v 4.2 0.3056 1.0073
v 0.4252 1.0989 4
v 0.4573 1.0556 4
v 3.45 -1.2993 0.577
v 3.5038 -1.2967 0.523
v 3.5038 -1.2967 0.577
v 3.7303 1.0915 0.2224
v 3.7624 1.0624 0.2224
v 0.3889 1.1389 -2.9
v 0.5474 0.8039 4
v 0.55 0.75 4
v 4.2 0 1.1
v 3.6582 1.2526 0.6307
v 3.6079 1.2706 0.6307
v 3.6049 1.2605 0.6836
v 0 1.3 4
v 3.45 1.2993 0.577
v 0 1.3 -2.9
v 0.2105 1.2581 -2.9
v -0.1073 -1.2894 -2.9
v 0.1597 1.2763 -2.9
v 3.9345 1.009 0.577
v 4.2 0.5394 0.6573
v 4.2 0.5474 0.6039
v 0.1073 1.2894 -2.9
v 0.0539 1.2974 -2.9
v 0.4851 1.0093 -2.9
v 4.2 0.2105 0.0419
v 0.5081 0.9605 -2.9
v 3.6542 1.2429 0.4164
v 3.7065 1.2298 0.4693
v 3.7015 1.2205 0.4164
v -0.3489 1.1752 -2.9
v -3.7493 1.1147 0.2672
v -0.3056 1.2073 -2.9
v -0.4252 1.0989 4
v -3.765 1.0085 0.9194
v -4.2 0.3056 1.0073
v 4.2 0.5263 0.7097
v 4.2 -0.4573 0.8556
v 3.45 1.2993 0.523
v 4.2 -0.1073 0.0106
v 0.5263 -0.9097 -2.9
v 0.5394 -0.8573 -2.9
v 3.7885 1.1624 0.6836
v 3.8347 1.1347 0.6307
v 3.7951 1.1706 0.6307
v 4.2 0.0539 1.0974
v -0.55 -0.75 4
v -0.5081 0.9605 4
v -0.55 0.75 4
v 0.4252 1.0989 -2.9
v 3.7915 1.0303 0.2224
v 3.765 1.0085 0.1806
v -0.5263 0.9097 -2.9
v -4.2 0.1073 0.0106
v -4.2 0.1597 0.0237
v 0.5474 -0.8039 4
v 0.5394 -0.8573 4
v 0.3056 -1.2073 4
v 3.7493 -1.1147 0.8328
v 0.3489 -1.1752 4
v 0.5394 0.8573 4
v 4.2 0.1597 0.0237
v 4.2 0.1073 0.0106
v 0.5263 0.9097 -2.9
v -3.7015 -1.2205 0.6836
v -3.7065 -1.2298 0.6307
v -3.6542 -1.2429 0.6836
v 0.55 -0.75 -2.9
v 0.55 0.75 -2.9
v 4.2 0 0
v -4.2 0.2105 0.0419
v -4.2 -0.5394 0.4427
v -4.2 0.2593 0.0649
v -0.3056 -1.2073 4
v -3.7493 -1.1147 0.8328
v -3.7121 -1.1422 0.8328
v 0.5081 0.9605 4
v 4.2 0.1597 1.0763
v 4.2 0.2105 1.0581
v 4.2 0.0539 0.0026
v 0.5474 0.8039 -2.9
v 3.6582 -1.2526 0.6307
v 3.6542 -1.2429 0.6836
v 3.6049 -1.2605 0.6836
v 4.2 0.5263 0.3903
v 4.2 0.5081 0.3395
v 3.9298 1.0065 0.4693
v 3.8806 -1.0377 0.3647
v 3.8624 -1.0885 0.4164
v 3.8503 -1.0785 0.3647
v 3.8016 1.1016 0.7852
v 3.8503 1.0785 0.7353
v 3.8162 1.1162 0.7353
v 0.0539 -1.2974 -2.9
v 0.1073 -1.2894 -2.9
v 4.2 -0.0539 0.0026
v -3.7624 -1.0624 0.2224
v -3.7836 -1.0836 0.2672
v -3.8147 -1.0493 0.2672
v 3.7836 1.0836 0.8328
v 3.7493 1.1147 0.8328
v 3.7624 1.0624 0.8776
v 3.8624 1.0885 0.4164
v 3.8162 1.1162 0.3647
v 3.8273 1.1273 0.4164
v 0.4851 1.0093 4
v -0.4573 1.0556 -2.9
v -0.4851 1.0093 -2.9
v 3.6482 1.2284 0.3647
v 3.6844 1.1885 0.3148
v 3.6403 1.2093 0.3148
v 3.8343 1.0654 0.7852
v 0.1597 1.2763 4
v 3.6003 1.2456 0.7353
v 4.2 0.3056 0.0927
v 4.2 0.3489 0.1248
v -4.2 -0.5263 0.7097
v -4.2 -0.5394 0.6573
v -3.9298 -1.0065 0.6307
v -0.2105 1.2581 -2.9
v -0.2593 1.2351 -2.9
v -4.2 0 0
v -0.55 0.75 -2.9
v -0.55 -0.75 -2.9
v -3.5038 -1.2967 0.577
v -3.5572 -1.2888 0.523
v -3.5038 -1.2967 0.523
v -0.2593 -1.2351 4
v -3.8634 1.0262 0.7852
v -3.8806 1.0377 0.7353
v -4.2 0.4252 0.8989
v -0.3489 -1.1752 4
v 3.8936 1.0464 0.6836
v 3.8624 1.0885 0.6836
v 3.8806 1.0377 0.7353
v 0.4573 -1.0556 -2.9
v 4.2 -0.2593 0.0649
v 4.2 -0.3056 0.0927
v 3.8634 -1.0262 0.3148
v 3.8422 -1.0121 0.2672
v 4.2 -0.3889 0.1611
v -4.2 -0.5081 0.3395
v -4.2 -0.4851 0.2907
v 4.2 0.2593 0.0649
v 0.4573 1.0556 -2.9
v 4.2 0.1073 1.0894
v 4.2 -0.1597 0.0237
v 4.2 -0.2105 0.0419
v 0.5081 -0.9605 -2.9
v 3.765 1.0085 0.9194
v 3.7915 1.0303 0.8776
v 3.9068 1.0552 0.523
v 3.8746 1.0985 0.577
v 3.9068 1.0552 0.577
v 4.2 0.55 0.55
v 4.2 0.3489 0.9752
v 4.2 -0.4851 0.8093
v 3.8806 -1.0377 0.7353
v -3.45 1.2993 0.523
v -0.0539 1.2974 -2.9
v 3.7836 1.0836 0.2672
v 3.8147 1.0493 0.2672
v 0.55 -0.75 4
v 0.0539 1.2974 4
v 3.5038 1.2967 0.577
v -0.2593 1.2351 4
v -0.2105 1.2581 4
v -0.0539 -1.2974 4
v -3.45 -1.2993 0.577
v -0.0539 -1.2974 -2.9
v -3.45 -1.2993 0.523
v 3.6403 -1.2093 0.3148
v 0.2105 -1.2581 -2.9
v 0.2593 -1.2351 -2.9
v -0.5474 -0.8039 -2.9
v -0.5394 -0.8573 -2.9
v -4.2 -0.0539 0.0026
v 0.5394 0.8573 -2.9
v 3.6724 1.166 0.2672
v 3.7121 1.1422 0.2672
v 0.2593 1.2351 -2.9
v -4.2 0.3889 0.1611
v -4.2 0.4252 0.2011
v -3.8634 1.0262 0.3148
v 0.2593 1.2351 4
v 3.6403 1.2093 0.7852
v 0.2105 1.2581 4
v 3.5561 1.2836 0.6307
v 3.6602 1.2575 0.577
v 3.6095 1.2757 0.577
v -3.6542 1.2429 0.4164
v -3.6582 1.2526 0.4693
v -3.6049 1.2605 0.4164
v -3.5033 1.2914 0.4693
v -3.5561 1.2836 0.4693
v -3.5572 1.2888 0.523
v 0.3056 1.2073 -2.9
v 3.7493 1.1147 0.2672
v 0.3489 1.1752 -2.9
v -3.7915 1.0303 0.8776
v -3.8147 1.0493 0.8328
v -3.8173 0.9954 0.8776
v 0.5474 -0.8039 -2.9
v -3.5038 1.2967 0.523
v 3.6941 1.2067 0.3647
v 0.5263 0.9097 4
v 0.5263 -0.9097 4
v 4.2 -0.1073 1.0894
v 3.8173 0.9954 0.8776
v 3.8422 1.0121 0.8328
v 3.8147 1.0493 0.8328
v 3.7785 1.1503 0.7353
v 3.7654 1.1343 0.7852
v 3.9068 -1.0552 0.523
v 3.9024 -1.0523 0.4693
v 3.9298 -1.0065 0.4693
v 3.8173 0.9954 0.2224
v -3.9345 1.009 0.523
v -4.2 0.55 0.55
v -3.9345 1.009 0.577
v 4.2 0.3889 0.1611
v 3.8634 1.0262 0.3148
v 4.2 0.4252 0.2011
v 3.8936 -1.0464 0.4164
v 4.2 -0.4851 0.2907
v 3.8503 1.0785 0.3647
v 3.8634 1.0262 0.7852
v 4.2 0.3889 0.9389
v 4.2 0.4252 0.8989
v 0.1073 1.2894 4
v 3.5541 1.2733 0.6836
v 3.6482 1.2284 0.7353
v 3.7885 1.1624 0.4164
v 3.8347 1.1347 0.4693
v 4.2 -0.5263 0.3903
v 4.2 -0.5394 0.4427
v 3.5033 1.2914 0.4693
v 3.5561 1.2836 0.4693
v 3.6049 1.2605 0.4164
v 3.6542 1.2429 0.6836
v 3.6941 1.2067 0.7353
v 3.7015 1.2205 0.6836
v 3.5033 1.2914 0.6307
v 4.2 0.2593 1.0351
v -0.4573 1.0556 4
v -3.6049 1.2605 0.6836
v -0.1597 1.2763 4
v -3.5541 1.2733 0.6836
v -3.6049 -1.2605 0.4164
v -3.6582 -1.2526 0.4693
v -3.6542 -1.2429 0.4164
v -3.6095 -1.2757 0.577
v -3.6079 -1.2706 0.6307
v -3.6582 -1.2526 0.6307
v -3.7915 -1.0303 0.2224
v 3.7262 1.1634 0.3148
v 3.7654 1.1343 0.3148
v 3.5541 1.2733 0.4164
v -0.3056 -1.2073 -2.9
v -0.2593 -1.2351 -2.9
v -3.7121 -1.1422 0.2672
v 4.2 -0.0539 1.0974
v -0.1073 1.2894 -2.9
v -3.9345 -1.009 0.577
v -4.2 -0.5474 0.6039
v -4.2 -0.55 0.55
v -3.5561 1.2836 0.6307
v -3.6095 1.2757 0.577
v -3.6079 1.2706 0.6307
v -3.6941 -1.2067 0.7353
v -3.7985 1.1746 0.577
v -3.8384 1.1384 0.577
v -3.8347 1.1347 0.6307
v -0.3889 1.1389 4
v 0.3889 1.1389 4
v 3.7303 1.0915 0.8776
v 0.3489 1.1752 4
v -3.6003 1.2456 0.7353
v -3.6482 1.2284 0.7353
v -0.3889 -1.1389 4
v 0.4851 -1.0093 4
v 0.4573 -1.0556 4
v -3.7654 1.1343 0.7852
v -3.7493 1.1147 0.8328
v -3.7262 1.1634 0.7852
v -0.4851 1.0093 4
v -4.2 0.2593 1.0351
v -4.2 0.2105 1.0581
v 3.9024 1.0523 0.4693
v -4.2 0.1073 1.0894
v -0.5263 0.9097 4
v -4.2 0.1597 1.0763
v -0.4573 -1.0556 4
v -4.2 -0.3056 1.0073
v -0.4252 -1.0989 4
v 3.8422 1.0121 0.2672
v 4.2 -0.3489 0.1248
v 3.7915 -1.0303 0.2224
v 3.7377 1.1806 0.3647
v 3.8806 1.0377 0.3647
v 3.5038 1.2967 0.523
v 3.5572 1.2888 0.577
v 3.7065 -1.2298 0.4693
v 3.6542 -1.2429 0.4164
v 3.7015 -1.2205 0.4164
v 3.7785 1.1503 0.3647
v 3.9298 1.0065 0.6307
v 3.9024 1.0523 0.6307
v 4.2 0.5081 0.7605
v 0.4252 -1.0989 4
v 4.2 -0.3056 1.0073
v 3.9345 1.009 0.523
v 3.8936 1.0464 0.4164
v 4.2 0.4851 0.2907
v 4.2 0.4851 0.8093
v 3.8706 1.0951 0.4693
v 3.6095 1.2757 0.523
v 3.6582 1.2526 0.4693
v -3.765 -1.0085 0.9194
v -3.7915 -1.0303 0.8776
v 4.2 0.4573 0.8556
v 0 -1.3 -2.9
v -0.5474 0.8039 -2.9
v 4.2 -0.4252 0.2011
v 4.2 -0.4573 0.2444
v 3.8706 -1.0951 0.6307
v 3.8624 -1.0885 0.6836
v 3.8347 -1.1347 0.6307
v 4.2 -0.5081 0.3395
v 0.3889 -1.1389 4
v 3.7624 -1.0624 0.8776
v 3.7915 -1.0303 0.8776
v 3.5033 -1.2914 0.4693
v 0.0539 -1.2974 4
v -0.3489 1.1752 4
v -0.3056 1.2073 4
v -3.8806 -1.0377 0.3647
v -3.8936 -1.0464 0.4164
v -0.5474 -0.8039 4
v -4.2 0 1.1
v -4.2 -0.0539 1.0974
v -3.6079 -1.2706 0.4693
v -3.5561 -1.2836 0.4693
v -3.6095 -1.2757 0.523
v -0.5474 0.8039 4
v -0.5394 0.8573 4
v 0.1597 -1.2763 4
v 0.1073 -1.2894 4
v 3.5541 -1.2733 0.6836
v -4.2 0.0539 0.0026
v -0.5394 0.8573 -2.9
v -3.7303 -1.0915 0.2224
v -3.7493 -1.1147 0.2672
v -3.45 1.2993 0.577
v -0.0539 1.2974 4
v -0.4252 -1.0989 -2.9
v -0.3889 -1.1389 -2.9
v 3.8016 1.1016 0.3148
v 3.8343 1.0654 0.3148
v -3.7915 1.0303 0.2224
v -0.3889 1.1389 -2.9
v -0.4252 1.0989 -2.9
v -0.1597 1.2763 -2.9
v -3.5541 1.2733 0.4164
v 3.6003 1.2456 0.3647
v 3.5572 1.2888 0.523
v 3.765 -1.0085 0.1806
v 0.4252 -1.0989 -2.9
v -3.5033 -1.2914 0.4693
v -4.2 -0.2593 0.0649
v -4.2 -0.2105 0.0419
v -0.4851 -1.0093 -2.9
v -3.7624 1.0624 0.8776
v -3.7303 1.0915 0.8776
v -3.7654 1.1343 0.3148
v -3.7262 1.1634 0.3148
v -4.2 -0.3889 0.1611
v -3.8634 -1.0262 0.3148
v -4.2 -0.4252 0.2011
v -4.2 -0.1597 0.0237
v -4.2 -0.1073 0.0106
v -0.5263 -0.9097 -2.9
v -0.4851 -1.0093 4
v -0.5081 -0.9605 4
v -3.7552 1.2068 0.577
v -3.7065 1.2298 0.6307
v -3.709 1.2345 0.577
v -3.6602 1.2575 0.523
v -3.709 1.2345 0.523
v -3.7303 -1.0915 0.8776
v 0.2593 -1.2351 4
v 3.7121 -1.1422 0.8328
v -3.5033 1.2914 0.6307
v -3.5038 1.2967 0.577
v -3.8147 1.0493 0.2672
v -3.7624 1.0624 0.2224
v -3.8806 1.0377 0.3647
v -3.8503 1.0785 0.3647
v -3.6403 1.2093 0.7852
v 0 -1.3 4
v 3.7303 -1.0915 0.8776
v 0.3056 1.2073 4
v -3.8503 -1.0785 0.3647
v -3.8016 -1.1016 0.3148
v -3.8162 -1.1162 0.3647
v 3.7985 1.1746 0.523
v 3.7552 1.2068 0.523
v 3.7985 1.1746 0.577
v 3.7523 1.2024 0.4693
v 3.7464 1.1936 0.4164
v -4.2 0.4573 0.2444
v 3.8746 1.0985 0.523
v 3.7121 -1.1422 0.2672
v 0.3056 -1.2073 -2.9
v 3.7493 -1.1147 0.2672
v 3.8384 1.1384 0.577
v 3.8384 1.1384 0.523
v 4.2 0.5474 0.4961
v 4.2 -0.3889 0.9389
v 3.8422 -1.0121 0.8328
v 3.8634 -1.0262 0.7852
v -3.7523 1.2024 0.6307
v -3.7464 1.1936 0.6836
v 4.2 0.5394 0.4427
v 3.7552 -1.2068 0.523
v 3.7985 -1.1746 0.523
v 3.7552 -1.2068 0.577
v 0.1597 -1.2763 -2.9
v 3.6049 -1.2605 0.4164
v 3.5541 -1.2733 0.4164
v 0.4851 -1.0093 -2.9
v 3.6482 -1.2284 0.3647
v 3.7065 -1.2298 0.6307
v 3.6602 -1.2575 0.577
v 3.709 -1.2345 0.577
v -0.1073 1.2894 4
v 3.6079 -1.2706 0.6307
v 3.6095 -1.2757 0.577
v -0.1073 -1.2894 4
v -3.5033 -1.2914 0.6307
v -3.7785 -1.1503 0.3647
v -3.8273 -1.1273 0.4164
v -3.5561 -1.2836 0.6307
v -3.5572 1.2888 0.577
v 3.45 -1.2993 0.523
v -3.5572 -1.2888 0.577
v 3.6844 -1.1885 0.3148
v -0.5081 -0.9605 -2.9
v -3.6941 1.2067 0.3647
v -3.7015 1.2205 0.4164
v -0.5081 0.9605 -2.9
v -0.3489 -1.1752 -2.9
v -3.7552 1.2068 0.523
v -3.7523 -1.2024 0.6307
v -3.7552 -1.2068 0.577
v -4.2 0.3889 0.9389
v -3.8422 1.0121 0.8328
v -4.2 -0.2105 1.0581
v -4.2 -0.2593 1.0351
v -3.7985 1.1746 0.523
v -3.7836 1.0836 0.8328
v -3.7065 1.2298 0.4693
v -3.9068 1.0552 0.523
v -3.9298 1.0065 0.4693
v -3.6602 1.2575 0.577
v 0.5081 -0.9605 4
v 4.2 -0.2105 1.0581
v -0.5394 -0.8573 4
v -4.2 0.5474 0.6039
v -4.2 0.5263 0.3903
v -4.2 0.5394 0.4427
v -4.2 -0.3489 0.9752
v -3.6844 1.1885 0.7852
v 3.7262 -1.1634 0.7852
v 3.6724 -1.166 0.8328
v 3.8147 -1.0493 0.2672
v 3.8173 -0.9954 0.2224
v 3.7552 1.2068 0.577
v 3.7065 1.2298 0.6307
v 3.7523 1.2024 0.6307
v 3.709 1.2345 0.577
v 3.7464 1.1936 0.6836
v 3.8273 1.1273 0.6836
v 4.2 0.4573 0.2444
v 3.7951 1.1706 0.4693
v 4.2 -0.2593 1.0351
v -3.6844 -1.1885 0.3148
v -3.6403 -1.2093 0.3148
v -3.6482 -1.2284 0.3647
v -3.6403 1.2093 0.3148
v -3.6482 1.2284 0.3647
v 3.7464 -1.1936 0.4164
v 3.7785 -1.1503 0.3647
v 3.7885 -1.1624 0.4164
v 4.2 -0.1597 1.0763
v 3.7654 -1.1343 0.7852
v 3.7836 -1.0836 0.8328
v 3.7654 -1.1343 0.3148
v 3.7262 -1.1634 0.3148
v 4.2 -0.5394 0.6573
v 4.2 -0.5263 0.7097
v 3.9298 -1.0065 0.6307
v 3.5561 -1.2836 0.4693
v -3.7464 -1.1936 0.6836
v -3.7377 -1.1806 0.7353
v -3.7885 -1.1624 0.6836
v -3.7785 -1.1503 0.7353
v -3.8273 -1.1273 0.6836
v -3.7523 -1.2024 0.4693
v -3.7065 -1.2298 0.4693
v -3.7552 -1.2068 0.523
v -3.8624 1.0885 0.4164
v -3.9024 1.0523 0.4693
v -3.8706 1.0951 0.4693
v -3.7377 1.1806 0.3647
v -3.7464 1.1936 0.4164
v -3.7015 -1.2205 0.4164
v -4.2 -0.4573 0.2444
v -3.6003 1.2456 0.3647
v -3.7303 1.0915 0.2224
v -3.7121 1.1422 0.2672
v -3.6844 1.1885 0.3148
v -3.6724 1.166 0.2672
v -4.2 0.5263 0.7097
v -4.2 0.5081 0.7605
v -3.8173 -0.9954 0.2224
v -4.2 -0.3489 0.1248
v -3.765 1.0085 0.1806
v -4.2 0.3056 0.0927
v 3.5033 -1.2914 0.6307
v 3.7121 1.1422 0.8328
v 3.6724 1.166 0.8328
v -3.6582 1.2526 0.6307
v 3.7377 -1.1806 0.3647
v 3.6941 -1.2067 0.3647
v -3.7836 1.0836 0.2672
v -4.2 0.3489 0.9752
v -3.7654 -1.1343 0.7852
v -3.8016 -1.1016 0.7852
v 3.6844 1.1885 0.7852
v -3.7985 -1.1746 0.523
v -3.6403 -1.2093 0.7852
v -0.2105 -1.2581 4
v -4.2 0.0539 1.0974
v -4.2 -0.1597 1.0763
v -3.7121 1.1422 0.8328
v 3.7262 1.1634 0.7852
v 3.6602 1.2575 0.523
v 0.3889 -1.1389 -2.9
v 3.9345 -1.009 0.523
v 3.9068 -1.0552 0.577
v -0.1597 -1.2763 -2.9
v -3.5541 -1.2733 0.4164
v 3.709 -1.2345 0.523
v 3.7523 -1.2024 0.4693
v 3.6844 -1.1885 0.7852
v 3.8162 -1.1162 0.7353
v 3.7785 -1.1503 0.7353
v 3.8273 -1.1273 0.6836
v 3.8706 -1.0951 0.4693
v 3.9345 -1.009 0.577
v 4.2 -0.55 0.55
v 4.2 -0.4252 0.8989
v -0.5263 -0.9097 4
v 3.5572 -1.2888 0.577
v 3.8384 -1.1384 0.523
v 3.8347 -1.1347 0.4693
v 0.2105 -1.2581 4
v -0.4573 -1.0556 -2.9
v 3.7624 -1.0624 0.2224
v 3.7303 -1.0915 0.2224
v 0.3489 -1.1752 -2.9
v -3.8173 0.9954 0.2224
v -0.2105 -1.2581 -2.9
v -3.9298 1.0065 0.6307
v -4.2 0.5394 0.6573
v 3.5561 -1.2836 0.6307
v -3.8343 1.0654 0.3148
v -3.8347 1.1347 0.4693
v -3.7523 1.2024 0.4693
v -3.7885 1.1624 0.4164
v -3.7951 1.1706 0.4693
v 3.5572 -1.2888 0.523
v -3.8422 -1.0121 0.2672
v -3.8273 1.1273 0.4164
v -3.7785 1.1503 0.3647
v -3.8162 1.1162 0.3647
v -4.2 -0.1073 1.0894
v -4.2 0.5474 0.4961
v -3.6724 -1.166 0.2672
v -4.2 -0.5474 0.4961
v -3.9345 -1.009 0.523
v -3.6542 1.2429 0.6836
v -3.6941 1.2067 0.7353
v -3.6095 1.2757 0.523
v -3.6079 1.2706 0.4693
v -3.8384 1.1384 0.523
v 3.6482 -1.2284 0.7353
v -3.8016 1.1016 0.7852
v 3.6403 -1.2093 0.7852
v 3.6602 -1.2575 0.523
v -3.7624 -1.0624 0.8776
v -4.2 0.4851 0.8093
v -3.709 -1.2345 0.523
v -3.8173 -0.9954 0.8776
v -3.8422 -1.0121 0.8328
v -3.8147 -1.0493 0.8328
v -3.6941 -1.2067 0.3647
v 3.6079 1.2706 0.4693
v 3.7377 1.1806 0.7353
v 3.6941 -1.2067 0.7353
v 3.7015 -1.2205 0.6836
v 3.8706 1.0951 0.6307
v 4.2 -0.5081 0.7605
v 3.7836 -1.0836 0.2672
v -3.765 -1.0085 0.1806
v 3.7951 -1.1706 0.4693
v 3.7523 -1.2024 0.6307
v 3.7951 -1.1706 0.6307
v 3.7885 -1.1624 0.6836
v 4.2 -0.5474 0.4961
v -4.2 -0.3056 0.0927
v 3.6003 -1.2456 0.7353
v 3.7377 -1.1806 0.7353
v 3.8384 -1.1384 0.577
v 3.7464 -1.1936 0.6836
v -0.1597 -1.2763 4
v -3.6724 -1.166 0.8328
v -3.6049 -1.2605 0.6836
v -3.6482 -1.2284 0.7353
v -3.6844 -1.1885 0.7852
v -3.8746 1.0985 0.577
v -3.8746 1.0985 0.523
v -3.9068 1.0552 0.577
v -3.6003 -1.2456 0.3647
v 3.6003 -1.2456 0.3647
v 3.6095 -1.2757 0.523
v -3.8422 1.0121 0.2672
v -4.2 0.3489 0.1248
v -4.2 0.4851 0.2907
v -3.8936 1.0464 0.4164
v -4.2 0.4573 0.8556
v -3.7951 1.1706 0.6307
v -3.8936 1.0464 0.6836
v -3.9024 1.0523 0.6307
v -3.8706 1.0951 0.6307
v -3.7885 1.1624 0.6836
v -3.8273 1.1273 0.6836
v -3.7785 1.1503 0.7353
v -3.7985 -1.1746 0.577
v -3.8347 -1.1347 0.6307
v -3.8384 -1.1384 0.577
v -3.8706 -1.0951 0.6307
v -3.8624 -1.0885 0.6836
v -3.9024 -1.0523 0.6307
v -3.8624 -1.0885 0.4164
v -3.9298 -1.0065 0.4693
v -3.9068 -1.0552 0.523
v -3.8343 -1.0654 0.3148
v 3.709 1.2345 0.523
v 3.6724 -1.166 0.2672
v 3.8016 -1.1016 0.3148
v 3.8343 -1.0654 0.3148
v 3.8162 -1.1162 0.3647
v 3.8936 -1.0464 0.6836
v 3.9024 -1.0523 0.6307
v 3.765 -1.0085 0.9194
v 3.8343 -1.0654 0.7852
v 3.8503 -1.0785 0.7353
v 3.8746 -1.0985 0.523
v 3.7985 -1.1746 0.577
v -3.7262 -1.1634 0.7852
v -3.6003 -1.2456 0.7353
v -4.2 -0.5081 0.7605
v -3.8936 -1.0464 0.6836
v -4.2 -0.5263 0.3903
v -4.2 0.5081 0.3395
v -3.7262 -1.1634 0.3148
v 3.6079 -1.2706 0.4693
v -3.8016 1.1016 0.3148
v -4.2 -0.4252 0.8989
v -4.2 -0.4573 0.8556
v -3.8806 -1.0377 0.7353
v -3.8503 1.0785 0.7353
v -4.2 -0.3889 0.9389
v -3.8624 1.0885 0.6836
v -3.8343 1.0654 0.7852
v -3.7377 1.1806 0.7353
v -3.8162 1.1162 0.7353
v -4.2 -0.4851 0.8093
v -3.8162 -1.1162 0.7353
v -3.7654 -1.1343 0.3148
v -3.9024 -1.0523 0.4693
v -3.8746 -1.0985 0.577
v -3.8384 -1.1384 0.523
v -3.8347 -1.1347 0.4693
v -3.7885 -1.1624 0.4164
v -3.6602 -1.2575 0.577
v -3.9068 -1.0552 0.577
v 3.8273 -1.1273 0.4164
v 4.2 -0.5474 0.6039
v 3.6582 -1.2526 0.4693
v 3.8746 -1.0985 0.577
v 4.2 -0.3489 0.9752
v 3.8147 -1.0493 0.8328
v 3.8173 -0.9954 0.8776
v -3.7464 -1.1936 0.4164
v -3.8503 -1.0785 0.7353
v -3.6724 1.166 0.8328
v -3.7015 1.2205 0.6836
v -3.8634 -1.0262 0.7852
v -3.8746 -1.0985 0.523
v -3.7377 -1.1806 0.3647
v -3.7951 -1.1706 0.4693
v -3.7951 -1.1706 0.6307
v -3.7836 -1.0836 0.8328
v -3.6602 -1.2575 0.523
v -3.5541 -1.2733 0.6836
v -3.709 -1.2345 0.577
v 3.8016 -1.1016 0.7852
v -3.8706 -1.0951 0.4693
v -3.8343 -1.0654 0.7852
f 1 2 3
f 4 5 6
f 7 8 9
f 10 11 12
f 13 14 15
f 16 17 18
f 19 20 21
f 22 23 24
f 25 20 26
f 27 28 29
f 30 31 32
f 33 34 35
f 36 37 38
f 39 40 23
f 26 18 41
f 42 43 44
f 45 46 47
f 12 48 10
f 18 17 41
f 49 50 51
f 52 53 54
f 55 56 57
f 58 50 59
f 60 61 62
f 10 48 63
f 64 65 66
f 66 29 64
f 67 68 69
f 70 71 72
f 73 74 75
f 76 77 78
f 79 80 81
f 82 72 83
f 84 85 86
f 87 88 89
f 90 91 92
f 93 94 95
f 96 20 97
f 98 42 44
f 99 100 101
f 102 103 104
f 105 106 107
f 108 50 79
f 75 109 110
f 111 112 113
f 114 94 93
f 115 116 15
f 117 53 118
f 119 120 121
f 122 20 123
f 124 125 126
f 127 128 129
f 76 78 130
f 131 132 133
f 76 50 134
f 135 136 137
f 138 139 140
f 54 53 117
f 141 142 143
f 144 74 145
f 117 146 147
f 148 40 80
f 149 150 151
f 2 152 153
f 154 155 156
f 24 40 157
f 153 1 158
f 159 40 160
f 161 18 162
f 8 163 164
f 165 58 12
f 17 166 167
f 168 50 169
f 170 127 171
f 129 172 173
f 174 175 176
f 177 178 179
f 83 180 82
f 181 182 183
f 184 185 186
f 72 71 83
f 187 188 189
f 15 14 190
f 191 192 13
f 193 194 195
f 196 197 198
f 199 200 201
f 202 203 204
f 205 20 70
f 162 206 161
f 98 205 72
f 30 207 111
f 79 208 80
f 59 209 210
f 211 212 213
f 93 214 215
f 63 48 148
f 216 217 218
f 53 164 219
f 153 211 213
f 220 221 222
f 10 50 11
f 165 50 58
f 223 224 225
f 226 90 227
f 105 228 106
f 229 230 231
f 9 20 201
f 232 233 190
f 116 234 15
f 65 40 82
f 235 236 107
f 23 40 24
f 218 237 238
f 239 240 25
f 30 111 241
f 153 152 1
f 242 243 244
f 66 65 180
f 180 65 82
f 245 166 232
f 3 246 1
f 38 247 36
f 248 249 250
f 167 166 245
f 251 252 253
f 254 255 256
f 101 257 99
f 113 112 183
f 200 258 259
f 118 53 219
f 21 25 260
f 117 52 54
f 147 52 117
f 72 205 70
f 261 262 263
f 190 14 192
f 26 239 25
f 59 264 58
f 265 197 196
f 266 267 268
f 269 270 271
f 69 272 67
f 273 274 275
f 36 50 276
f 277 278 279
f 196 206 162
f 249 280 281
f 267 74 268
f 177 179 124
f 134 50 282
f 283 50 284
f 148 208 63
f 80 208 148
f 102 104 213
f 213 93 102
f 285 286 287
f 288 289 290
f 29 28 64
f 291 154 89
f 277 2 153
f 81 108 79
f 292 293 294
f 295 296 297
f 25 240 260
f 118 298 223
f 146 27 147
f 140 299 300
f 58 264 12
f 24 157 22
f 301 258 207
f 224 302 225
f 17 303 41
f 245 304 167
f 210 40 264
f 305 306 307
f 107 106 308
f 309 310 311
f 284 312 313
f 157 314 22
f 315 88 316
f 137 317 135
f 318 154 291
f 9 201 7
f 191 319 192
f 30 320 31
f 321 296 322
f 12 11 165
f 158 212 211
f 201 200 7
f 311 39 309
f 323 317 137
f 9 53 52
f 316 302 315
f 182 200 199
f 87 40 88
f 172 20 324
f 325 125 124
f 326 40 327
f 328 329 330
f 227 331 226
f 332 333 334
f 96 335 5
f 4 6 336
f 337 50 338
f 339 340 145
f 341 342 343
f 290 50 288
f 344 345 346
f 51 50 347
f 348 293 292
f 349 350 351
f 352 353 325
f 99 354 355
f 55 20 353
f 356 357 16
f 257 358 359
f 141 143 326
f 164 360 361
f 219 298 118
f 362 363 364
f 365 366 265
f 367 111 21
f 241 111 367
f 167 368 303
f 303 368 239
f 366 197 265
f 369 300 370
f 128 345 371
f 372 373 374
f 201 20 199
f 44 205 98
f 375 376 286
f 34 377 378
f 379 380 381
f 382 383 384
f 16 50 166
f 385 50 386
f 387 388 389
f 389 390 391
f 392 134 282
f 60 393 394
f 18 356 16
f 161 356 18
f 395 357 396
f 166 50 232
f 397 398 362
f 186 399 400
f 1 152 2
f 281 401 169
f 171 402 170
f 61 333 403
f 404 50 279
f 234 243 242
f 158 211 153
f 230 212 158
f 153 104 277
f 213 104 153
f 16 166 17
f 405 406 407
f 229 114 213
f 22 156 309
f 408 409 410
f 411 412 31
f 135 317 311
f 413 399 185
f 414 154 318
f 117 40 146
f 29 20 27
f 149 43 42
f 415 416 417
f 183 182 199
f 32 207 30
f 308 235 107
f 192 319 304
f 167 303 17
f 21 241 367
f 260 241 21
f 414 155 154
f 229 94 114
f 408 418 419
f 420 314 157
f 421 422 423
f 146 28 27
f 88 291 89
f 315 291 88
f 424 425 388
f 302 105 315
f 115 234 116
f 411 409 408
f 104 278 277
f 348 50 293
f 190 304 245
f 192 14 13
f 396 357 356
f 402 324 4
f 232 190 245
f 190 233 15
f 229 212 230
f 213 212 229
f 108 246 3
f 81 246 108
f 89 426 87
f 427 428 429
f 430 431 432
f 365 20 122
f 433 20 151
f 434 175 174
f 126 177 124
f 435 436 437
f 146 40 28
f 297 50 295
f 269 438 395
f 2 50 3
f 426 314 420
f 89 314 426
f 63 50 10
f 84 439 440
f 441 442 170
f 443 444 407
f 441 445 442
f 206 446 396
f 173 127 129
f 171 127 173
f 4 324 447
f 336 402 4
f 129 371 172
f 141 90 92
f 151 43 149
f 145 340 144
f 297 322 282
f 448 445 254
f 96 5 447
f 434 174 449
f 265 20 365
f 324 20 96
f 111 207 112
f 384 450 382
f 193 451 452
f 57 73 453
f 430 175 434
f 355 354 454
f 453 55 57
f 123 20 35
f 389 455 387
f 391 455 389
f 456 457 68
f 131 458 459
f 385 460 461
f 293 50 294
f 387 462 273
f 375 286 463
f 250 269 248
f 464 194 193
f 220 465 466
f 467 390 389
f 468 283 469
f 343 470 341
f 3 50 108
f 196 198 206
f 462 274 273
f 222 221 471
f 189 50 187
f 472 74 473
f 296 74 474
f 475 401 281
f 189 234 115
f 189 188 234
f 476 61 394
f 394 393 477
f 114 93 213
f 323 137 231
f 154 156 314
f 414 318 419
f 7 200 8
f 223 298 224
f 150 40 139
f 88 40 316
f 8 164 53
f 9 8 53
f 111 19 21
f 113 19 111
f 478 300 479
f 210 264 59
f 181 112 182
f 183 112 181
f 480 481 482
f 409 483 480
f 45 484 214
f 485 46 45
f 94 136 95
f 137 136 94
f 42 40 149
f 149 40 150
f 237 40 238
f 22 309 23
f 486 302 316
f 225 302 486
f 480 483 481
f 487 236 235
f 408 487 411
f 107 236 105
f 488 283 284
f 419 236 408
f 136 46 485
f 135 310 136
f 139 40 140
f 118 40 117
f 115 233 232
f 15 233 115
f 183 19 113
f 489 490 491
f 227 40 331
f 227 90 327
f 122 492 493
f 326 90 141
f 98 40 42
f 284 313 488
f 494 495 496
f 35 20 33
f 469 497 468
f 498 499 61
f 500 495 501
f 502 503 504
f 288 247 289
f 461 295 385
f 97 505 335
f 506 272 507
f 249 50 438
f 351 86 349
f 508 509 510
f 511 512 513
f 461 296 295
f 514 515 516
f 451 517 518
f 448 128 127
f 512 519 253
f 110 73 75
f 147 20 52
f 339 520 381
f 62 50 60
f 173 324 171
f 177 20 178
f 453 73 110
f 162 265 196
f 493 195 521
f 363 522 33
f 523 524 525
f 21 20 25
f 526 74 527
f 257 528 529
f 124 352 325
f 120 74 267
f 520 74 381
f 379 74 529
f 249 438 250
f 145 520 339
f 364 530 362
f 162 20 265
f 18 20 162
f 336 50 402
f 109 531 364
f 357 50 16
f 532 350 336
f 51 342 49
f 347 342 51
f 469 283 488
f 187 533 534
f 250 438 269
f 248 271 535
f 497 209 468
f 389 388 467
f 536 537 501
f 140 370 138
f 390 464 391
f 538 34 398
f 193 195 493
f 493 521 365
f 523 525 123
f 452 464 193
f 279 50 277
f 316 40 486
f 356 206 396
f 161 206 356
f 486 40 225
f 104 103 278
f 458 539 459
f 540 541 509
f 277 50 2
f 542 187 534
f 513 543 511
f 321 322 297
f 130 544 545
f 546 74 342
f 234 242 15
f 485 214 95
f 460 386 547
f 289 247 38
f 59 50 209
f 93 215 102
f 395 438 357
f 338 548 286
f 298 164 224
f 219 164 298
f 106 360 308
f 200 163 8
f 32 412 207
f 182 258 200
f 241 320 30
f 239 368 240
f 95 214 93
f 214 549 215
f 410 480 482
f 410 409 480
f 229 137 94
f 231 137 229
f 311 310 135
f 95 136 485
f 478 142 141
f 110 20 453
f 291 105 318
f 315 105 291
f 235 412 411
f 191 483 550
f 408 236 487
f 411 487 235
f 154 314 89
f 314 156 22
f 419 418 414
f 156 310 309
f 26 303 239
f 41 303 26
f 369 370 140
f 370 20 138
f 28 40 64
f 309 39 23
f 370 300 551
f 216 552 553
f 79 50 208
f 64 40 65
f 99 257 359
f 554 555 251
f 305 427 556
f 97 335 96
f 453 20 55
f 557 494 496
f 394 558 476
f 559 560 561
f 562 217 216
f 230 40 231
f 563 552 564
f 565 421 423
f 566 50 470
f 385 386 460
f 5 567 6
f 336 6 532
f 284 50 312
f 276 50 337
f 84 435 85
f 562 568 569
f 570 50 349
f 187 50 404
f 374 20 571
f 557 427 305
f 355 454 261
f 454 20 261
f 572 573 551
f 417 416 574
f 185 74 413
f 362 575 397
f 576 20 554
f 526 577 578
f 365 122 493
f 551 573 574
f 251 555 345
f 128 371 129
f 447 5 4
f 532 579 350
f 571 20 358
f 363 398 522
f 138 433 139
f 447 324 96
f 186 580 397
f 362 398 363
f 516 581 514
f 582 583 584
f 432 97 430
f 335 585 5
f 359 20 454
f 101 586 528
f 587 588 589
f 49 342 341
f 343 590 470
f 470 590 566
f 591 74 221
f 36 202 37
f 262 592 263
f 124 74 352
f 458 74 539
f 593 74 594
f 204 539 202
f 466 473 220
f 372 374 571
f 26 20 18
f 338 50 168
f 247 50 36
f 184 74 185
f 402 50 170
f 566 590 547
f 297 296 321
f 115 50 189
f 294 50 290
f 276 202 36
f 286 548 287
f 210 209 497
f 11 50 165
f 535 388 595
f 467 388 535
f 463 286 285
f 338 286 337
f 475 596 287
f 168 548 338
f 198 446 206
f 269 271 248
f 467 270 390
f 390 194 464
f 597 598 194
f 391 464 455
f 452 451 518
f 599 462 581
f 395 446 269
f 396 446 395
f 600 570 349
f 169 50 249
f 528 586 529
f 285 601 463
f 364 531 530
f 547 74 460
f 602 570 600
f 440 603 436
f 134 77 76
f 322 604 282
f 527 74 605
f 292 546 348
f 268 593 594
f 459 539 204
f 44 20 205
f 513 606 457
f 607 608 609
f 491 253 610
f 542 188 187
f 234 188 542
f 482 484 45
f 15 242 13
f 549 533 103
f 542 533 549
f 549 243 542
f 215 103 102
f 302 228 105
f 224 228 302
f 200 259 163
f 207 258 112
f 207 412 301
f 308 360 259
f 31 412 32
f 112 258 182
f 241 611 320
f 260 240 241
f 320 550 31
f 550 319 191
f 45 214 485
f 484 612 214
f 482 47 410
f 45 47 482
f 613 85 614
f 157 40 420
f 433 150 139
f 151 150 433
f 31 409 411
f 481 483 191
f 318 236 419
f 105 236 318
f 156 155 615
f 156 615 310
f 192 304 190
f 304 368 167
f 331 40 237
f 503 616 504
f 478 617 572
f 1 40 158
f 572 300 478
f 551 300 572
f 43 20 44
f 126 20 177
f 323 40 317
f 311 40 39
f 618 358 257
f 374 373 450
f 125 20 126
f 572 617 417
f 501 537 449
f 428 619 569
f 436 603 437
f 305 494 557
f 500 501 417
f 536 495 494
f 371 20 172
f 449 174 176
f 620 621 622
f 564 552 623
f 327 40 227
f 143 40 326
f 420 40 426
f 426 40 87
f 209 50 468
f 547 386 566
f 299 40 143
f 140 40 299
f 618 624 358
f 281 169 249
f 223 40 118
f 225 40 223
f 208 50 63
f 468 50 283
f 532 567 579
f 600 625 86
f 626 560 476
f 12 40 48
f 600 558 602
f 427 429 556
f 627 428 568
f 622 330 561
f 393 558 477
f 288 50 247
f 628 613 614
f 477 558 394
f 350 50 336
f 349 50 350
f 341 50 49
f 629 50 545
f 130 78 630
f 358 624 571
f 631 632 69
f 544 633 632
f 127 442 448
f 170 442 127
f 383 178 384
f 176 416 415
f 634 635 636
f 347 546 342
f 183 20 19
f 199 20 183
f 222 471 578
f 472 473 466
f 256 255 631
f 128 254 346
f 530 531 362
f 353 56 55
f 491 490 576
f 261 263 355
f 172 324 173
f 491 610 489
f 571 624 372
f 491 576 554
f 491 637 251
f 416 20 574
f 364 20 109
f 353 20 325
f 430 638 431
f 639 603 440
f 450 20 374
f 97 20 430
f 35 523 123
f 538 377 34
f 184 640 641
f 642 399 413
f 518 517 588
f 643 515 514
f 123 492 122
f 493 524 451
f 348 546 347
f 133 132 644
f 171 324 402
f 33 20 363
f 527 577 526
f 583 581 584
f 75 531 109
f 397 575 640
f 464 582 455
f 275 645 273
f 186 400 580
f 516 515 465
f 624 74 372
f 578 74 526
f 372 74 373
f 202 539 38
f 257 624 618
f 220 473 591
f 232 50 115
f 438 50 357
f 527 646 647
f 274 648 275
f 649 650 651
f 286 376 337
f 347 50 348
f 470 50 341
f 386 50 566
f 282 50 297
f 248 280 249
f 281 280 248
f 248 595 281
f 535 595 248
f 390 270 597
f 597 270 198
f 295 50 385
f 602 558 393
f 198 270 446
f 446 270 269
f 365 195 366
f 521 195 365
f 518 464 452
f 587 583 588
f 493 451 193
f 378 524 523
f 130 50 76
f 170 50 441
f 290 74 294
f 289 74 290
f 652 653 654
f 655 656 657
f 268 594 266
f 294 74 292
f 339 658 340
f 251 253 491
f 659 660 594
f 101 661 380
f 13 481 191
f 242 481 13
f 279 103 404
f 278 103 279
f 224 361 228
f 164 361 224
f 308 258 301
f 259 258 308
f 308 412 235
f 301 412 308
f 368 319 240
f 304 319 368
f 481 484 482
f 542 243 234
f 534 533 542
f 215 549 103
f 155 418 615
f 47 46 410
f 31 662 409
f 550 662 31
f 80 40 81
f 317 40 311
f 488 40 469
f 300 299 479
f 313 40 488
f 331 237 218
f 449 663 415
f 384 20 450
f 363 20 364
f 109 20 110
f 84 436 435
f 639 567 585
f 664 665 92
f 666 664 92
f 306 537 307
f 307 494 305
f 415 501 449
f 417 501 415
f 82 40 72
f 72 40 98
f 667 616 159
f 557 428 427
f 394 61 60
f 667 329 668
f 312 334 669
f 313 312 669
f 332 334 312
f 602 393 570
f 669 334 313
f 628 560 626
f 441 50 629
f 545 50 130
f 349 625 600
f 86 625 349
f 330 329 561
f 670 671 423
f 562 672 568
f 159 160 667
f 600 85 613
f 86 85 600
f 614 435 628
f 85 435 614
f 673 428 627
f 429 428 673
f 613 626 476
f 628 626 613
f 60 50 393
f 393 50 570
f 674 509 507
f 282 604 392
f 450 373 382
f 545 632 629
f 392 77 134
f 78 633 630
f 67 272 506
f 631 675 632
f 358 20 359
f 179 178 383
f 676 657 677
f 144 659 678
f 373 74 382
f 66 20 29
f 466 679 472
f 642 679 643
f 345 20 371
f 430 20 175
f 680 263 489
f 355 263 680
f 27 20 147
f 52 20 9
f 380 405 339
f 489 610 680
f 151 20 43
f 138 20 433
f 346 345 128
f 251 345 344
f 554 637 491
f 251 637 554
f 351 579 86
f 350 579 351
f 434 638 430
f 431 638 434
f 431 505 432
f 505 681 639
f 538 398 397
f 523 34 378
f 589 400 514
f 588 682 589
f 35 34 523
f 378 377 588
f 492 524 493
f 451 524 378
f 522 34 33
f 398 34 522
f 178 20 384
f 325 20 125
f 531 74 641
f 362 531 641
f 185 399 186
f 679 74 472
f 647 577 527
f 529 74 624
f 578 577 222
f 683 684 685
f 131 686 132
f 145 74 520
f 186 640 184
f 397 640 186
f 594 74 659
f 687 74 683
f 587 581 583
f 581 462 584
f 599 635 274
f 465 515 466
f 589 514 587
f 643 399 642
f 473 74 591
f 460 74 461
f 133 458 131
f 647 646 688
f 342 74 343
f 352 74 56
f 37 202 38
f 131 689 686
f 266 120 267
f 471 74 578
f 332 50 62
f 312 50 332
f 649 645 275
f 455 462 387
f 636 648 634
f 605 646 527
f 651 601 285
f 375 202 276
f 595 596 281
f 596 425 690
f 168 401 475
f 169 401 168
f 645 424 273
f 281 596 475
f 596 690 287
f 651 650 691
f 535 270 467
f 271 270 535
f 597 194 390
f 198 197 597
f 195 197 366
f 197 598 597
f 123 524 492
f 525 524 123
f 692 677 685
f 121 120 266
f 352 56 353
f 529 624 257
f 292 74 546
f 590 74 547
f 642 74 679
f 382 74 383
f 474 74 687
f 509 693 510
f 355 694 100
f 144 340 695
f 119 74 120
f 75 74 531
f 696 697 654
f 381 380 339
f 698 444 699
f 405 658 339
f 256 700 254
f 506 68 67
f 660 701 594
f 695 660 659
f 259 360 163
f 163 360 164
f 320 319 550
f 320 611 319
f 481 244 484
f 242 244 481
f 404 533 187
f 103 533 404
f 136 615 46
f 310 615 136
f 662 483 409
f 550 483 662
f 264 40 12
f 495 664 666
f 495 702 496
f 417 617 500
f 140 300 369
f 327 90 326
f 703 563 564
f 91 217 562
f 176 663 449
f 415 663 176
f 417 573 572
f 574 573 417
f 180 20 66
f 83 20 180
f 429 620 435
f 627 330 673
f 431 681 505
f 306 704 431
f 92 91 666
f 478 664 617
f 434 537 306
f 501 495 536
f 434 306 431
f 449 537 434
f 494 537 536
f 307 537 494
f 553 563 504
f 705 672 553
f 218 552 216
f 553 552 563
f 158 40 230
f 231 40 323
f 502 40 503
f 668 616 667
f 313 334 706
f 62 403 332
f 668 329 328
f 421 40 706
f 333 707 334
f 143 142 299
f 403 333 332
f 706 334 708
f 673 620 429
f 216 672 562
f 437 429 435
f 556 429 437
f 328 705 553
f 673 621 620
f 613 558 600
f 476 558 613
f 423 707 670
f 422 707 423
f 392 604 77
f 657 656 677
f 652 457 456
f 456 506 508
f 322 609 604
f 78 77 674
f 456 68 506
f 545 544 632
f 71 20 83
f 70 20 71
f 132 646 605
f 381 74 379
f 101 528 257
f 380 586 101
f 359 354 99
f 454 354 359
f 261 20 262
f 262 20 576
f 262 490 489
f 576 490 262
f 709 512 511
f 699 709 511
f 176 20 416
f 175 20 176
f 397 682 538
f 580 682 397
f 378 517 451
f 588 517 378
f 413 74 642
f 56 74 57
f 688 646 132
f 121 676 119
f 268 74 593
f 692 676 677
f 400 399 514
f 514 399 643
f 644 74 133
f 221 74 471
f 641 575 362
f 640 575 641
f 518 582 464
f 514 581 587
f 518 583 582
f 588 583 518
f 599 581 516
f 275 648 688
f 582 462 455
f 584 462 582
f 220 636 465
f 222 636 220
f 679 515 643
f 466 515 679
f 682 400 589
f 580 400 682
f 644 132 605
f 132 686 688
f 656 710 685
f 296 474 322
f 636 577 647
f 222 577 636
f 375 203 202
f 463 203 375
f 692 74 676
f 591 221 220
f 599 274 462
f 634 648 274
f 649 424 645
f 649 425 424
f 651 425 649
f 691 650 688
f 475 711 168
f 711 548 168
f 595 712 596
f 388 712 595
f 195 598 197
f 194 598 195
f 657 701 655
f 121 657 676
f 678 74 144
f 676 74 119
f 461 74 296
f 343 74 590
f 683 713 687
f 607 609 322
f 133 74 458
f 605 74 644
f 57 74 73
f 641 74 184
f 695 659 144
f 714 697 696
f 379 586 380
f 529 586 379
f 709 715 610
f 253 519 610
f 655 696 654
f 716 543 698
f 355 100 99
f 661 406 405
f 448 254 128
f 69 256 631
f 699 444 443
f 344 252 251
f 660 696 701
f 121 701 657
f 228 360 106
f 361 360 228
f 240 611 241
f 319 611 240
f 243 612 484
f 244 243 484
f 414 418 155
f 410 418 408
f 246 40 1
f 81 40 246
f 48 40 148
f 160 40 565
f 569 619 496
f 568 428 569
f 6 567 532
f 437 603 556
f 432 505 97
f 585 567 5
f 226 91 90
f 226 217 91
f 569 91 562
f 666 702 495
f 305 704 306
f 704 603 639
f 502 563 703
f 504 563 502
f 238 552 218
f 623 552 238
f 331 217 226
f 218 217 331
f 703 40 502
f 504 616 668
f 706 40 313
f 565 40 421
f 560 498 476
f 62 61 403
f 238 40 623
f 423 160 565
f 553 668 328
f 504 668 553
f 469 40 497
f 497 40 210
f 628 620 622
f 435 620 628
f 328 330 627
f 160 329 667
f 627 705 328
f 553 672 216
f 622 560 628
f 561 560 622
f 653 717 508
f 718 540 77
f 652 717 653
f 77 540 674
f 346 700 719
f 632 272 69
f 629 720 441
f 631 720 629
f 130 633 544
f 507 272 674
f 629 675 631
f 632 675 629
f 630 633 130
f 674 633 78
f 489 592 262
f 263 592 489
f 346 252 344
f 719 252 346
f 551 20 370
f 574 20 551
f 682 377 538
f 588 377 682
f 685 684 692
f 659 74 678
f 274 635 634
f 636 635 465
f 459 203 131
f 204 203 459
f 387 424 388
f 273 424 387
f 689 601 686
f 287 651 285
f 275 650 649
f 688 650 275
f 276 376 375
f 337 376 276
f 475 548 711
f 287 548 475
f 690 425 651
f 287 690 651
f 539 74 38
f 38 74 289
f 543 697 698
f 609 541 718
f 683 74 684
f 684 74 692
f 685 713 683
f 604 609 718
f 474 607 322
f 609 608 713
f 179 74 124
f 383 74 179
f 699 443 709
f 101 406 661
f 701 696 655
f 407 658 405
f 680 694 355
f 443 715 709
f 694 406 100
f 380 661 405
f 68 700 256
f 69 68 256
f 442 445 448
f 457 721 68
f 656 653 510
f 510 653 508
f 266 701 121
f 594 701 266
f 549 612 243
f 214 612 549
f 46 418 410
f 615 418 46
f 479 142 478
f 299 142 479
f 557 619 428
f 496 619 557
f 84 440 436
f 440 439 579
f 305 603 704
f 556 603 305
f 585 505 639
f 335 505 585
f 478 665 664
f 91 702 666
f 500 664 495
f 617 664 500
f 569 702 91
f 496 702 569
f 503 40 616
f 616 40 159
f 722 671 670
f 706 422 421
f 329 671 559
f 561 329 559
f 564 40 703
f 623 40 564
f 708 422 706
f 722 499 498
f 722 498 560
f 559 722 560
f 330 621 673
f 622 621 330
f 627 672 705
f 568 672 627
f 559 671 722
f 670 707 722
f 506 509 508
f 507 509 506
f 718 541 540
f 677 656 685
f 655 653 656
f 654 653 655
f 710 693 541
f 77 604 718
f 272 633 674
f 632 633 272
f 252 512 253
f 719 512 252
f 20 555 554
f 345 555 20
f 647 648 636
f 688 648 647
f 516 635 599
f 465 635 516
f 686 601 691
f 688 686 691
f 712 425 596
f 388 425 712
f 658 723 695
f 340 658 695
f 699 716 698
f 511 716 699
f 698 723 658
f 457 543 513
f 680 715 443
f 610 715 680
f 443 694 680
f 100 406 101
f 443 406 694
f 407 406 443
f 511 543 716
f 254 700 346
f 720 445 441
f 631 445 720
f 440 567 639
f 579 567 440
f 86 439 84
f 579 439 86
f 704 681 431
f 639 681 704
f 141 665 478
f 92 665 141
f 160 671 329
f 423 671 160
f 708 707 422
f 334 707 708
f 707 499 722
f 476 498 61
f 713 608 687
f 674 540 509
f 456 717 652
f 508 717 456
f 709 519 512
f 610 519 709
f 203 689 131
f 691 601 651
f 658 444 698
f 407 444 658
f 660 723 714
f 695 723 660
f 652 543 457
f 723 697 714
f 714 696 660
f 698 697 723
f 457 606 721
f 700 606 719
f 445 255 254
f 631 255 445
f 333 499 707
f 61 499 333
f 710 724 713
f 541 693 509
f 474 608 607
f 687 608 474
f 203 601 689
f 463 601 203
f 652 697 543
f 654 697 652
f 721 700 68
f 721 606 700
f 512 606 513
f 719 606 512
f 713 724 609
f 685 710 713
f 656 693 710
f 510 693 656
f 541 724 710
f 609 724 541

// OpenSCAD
module rounded_rectangular_block() {
    // Dimensions
    length = 8.0;
    width = 2.6;
    height = 1.1;
    radius = 1.3; // Large fillet radius for long edges
    end_radius = 0.55; // Slightly radiused ends

    // Main block with rounded edges
    hull() {
        // Create the four corner spheres
        translate([length/2 - end_radius, width/2 - end_radius, height/2])
            sphere(r=end_radius, $fn=64);
        translate([-length/2 + end_radius, width/2 - end_radius, height/2])
            sphere(r=end_radius, $fn=64);
        translate([length/2 - end_radius, -width/2 + end_radius, height/2])
            sphere(r=end_radius, $fn=64);
        translate([-length/2 + end_radius, -width/2 + end_radius, height/2])
            sphere(r=end_radius, $fn=64);

        // Create the four edge cylinders
        translate([0, width/2 - end_radius, height/2])
            cylinder(h=length - 2*end_radius, r=end_radius, center=true, $fn=64);
        translate([0, -width/2 + end_radius, height/2])
            cylinder(h=length - 2*end_radius, r=end_radius, center=true, $fn=64);
        translate([length/2 - end_radius, 0, height/2])
            rotate([0, 90, 0])
            cylinder(h=width - 2*end_radius, r=end_radius, center=true, $fn=64);
        translate([-length/2 + end_radius, 0, height/2])
            rotate([0, 90, 0])
            cylinder(h=width - 2*end_radius, r=end_radius, center=true, $fn=64);
    }
}

rounded_rectangular_block();
